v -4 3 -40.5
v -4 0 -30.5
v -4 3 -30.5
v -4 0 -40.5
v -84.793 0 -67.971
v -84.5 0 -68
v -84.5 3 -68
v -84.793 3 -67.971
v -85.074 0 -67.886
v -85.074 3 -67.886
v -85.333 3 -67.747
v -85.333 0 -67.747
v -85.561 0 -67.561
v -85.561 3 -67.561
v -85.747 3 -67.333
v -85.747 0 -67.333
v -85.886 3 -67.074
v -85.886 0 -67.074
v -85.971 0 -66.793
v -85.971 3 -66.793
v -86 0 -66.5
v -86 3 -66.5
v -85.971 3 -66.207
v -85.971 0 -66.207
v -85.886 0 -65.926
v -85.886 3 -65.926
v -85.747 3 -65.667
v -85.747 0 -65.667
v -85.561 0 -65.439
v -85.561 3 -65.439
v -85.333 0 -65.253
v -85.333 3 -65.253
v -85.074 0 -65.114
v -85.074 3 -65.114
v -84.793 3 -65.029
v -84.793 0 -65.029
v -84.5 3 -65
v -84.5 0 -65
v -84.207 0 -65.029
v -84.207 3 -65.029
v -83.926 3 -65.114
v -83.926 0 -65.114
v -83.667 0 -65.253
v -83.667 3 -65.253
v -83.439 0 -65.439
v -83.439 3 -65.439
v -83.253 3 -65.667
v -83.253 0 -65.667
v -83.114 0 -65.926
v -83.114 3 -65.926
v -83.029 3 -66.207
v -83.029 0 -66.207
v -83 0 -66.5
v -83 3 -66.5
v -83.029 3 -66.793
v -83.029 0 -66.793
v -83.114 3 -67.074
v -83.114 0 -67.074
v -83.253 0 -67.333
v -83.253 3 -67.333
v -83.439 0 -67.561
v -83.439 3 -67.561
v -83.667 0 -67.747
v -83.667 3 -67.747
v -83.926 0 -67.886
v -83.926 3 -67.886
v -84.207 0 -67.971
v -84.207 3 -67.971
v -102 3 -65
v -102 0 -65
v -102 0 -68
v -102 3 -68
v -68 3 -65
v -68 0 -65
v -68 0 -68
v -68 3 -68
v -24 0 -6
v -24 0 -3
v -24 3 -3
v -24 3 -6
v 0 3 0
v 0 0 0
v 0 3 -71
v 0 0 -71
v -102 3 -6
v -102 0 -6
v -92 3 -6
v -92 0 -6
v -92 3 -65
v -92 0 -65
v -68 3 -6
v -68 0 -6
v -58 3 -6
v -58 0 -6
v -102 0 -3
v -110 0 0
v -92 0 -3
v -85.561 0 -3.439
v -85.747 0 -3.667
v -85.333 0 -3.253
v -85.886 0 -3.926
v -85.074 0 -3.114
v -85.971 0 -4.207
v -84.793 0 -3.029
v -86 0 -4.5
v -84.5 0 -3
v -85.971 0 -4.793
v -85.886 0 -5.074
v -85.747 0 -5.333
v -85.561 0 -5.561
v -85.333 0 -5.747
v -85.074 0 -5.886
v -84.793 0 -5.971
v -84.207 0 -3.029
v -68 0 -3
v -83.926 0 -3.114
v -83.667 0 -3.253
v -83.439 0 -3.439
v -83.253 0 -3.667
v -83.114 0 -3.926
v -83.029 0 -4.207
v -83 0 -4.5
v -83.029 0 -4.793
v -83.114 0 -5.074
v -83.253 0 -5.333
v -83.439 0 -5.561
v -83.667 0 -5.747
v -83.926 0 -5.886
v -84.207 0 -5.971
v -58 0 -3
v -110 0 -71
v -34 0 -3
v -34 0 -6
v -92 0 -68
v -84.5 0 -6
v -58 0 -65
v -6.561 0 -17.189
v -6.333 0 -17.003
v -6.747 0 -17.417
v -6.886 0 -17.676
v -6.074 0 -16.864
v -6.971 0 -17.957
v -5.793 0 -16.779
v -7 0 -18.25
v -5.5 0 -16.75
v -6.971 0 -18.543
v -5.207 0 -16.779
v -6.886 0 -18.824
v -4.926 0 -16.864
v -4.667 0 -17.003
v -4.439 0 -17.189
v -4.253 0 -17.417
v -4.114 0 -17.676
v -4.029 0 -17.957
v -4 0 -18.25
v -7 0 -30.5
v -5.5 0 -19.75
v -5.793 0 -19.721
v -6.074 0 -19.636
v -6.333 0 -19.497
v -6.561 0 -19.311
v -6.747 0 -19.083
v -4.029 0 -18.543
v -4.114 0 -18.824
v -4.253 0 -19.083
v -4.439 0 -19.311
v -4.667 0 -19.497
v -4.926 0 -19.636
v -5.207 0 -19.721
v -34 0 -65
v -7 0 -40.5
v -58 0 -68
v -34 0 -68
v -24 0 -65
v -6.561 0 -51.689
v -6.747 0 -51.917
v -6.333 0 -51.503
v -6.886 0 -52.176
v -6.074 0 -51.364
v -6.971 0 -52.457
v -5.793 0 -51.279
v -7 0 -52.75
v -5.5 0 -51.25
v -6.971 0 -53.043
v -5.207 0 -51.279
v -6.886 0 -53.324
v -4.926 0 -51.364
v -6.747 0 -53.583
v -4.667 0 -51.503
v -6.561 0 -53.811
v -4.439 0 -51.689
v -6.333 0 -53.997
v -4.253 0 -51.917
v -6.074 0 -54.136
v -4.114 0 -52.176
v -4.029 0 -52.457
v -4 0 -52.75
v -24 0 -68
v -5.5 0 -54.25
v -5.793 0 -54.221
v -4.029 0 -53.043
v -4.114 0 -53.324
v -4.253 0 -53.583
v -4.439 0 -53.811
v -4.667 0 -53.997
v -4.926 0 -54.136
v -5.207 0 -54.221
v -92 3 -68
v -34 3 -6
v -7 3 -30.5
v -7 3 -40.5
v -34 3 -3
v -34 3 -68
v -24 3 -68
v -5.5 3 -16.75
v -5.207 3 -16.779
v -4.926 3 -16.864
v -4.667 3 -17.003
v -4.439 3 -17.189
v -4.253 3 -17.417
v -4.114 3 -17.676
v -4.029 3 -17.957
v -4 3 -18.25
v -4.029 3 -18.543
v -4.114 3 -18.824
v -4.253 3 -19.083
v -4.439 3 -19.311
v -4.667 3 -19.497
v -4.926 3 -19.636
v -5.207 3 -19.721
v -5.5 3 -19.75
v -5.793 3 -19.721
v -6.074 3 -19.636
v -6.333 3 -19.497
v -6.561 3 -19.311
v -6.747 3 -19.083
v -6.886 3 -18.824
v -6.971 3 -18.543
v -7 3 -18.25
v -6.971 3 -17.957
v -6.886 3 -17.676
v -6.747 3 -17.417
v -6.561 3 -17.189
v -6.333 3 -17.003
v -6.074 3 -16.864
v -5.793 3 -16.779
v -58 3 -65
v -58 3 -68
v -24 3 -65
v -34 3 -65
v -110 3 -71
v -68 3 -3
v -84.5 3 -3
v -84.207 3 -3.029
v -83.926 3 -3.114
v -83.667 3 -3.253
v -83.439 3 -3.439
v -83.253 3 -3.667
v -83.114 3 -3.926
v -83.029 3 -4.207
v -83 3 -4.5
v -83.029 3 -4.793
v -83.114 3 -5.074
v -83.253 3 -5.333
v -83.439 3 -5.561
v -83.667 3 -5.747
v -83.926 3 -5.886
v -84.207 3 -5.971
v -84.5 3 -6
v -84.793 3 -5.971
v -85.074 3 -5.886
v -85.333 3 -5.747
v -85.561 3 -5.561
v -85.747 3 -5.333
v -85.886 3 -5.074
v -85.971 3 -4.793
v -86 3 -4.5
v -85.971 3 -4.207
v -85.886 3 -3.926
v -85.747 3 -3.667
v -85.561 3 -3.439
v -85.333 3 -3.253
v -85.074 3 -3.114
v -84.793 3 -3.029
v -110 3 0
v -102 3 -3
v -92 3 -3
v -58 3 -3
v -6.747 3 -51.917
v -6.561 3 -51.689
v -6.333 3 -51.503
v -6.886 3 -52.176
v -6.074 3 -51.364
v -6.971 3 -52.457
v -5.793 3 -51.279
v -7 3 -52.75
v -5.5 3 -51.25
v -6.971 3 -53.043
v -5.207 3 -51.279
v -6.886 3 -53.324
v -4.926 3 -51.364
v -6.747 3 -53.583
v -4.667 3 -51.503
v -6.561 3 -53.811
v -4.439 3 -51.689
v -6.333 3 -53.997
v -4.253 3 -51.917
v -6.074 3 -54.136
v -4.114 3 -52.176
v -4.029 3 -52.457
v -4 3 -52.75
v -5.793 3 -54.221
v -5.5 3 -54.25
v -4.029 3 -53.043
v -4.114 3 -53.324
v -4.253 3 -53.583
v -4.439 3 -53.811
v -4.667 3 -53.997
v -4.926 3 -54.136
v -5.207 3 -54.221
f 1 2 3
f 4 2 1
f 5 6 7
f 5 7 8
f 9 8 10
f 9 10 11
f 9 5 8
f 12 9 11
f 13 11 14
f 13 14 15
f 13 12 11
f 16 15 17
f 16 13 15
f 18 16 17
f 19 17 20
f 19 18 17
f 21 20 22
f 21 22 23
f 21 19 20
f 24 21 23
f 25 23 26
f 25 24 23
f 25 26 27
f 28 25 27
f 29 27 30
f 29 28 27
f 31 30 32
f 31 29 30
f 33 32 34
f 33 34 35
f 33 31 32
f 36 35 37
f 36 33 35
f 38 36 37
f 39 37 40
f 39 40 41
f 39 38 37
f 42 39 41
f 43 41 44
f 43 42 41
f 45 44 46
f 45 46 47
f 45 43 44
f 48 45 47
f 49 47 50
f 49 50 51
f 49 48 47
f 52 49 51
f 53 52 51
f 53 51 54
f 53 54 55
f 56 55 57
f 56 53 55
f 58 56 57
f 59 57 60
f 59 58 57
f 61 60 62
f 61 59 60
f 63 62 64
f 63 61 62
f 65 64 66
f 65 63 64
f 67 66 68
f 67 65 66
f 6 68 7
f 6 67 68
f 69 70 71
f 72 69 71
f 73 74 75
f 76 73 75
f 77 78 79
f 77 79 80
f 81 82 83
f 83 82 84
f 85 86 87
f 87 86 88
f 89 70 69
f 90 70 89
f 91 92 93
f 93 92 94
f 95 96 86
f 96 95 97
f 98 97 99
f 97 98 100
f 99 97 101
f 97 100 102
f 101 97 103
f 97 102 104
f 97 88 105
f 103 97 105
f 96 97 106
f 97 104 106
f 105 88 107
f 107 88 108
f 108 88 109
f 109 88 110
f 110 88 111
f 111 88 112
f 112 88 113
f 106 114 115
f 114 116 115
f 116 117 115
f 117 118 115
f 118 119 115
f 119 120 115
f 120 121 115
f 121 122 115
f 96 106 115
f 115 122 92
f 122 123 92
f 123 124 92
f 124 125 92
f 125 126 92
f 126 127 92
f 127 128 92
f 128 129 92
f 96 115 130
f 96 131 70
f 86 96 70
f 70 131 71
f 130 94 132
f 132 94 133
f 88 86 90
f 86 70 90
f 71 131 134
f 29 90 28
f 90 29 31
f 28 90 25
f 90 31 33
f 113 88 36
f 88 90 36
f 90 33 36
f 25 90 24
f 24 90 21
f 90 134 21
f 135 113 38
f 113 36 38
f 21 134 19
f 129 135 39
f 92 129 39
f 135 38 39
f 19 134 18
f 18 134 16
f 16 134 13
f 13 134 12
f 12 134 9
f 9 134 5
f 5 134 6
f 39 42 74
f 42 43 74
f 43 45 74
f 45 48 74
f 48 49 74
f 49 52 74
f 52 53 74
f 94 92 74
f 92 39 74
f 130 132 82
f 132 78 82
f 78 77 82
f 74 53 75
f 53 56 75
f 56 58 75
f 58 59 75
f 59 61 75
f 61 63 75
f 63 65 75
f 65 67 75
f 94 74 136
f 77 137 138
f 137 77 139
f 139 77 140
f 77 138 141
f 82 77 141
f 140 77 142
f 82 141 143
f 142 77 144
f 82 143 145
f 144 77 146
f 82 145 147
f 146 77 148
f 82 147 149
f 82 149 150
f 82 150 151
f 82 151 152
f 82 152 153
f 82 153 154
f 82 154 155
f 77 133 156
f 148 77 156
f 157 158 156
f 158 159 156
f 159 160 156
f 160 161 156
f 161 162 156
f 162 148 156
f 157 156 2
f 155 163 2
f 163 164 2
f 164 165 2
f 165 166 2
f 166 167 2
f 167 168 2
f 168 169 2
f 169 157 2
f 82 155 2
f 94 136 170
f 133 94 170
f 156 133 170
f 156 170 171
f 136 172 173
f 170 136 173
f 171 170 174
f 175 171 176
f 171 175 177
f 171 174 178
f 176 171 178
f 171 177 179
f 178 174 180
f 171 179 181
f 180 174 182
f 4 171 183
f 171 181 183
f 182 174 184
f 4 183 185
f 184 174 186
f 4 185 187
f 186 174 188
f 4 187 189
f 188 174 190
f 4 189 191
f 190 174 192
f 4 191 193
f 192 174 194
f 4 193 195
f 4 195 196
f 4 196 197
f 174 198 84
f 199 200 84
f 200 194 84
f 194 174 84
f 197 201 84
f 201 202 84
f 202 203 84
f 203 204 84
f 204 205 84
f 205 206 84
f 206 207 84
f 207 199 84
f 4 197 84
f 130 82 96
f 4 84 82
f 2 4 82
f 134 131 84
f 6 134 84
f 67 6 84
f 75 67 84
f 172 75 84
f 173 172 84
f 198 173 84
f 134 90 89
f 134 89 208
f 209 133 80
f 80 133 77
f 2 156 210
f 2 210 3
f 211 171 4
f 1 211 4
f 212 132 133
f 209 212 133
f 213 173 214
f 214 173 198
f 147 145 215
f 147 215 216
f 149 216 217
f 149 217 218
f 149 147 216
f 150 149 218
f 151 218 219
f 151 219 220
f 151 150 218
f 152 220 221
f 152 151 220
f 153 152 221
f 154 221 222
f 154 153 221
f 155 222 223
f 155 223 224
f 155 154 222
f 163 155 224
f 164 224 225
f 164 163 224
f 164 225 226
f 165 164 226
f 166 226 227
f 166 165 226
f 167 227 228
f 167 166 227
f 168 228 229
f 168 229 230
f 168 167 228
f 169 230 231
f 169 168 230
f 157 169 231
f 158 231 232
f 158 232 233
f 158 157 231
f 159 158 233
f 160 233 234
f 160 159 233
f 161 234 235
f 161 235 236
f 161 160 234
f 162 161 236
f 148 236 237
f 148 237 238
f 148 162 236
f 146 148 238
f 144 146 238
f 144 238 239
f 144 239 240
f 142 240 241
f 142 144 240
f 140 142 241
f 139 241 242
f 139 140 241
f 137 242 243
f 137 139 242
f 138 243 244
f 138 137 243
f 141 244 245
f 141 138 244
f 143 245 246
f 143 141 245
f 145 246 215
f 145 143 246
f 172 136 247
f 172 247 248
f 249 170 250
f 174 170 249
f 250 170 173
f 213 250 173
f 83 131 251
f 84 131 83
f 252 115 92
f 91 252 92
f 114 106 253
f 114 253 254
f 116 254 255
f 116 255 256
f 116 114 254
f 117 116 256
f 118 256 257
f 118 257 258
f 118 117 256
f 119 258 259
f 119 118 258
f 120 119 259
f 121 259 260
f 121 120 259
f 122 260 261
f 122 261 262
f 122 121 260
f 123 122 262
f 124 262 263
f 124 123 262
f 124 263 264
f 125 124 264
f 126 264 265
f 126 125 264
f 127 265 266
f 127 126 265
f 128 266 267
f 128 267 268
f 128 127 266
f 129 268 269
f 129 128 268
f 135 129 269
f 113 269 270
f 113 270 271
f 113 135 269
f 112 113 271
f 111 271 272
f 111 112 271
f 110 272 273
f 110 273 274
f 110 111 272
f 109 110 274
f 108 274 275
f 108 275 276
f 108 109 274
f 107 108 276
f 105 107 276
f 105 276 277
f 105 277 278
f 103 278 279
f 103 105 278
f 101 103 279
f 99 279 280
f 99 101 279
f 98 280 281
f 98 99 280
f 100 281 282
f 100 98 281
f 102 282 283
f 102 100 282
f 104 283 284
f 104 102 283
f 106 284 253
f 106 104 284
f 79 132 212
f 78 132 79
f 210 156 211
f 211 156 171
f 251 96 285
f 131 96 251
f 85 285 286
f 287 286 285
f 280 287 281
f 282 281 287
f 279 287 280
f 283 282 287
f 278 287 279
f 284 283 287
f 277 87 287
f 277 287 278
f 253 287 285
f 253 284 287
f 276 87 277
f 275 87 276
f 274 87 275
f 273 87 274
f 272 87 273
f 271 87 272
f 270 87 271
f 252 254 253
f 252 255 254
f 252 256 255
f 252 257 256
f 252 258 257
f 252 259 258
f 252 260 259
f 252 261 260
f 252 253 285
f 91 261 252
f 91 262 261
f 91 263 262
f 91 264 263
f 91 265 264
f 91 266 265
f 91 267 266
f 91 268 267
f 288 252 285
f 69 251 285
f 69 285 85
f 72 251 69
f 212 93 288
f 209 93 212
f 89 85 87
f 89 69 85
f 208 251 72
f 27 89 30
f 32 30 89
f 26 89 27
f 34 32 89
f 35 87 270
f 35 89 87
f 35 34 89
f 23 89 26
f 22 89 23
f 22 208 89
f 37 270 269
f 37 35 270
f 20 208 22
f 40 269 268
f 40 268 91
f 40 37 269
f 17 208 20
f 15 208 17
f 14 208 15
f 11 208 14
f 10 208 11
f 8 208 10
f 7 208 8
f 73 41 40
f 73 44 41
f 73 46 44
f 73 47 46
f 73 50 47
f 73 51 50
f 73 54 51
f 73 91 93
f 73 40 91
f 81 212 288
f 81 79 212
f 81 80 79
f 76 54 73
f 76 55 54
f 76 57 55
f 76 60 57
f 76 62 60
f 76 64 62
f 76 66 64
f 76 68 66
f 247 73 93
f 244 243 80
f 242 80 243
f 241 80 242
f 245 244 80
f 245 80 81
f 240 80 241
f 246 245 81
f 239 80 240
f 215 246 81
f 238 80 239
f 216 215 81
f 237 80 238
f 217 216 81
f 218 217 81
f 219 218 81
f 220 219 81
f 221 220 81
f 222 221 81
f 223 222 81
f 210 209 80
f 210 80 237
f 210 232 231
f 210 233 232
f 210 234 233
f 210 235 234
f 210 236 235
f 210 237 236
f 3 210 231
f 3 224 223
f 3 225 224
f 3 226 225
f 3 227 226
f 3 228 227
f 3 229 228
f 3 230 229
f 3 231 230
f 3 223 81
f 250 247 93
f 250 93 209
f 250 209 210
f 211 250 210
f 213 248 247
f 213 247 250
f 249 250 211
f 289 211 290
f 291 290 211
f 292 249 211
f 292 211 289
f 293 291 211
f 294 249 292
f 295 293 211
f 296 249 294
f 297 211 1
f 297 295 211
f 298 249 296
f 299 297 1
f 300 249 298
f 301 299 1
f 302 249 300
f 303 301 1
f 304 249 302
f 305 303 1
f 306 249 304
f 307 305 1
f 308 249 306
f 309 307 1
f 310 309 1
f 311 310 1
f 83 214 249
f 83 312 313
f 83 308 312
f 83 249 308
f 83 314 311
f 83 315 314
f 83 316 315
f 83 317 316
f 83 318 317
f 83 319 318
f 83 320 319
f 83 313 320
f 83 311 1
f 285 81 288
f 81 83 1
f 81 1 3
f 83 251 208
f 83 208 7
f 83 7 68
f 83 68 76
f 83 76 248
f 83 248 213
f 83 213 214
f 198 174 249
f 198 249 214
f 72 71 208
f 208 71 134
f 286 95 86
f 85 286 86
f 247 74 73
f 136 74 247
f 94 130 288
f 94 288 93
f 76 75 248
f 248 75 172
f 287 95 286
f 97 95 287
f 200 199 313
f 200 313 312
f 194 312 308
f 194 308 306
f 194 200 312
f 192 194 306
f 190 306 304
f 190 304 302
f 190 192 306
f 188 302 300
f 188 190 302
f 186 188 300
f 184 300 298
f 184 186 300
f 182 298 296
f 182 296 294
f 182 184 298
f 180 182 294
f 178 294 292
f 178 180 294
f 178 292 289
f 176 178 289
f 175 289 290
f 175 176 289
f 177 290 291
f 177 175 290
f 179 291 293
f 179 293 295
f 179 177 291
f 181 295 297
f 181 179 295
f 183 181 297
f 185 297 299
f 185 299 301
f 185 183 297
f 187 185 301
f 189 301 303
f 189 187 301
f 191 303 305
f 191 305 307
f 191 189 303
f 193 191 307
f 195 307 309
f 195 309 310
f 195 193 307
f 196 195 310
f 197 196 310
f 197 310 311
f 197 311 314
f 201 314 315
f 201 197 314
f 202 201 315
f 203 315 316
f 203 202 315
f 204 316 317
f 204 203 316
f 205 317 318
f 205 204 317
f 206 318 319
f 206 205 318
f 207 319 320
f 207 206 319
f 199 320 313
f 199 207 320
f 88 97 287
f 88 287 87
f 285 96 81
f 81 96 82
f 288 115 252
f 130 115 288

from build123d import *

# Parameters (mm, degrees)
SKETCH1_W           = 110
SKETCH1_H           = 71
SKETCH1_R           = 1.5
SKETCH1_W_2         = 10
SKETCH1_H_2         = 3
SKETCH1_W_3         = 3
SKETCH1_H_3         = 10
BOSS_EXTRUDE1_DEPTH = 3


with BuildPart() as part:
    # Sketch1 → Boss-Extrude1 (new body)
    with BuildSketch(Plane(origin=(0, 0, 0), x_dir=(1, 0, 0), z_dir=(0, 1, 0))):
        with Locations((-55, 35.5)):
            Rectangle(SKETCH1_W, SKETCH1_H)
        with Locations(Location((-5.5, 18.25, 0), (0, 0, 270))):
            Circle(SKETCH1_R, mode=Mode.SUBTRACT)
        with Locations(Location((-5.5, 52.75, 0), (0, 0, 90))):
            Circle(SKETCH1_R, mode=Mode.SUBTRACT)
        with Locations(Location((-84.5, 4.5, 0), (0, 0, 270))):
            Circle(SKETCH1_R, mode=Mode.SUBTRACT)
        with Locations(Location((-84.5, 66.5, 0), (0, 0, 90))):
            Circle(SKETCH1_R, mode=Mode.SUBTRACT)
        with Locations((-63, 4.5)):
            Rectangle(SKETCH1_W_2, SKETCH1_H_2, mode=Mode.SUBTRACT)
        with Locations((-5.5, 35.5)):
            Rectangle(SKETCH1_W_3, SKETCH1_H_3, mode=Mode.SUBTRACT)
        with Locations((-29, 4.5)):
            Rectangle(SKETCH1_W_2, SKETCH1_H_2, mode=Mode.SUBTRACT)
        with Locations((-97, 4.5)):
            Rectangle(SKETCH1_W_2, SKETCH1_H_2, mode=Mode.SUBTRACT)
        with Locations((-29, 66.5)):
            Rectangle(SKETCH1_W_2, SKETCH1_H_2, mode=Mode.SUBTRACT)
        with Locations((-63, 66.5)):
            Rectangle(SKETCH1_W_2, SKETCH1_H_2, mode=Mode.SUBTRACT)
        with Locations((-97, 66.5)):
            Rectangle(SKETCH1_W_2, SKETCH1_H_2, mode=Mode.SUBTRACT)
    extrude(amount=BOSS_EXTRUDE1_DEPTH)


solid = part.part
